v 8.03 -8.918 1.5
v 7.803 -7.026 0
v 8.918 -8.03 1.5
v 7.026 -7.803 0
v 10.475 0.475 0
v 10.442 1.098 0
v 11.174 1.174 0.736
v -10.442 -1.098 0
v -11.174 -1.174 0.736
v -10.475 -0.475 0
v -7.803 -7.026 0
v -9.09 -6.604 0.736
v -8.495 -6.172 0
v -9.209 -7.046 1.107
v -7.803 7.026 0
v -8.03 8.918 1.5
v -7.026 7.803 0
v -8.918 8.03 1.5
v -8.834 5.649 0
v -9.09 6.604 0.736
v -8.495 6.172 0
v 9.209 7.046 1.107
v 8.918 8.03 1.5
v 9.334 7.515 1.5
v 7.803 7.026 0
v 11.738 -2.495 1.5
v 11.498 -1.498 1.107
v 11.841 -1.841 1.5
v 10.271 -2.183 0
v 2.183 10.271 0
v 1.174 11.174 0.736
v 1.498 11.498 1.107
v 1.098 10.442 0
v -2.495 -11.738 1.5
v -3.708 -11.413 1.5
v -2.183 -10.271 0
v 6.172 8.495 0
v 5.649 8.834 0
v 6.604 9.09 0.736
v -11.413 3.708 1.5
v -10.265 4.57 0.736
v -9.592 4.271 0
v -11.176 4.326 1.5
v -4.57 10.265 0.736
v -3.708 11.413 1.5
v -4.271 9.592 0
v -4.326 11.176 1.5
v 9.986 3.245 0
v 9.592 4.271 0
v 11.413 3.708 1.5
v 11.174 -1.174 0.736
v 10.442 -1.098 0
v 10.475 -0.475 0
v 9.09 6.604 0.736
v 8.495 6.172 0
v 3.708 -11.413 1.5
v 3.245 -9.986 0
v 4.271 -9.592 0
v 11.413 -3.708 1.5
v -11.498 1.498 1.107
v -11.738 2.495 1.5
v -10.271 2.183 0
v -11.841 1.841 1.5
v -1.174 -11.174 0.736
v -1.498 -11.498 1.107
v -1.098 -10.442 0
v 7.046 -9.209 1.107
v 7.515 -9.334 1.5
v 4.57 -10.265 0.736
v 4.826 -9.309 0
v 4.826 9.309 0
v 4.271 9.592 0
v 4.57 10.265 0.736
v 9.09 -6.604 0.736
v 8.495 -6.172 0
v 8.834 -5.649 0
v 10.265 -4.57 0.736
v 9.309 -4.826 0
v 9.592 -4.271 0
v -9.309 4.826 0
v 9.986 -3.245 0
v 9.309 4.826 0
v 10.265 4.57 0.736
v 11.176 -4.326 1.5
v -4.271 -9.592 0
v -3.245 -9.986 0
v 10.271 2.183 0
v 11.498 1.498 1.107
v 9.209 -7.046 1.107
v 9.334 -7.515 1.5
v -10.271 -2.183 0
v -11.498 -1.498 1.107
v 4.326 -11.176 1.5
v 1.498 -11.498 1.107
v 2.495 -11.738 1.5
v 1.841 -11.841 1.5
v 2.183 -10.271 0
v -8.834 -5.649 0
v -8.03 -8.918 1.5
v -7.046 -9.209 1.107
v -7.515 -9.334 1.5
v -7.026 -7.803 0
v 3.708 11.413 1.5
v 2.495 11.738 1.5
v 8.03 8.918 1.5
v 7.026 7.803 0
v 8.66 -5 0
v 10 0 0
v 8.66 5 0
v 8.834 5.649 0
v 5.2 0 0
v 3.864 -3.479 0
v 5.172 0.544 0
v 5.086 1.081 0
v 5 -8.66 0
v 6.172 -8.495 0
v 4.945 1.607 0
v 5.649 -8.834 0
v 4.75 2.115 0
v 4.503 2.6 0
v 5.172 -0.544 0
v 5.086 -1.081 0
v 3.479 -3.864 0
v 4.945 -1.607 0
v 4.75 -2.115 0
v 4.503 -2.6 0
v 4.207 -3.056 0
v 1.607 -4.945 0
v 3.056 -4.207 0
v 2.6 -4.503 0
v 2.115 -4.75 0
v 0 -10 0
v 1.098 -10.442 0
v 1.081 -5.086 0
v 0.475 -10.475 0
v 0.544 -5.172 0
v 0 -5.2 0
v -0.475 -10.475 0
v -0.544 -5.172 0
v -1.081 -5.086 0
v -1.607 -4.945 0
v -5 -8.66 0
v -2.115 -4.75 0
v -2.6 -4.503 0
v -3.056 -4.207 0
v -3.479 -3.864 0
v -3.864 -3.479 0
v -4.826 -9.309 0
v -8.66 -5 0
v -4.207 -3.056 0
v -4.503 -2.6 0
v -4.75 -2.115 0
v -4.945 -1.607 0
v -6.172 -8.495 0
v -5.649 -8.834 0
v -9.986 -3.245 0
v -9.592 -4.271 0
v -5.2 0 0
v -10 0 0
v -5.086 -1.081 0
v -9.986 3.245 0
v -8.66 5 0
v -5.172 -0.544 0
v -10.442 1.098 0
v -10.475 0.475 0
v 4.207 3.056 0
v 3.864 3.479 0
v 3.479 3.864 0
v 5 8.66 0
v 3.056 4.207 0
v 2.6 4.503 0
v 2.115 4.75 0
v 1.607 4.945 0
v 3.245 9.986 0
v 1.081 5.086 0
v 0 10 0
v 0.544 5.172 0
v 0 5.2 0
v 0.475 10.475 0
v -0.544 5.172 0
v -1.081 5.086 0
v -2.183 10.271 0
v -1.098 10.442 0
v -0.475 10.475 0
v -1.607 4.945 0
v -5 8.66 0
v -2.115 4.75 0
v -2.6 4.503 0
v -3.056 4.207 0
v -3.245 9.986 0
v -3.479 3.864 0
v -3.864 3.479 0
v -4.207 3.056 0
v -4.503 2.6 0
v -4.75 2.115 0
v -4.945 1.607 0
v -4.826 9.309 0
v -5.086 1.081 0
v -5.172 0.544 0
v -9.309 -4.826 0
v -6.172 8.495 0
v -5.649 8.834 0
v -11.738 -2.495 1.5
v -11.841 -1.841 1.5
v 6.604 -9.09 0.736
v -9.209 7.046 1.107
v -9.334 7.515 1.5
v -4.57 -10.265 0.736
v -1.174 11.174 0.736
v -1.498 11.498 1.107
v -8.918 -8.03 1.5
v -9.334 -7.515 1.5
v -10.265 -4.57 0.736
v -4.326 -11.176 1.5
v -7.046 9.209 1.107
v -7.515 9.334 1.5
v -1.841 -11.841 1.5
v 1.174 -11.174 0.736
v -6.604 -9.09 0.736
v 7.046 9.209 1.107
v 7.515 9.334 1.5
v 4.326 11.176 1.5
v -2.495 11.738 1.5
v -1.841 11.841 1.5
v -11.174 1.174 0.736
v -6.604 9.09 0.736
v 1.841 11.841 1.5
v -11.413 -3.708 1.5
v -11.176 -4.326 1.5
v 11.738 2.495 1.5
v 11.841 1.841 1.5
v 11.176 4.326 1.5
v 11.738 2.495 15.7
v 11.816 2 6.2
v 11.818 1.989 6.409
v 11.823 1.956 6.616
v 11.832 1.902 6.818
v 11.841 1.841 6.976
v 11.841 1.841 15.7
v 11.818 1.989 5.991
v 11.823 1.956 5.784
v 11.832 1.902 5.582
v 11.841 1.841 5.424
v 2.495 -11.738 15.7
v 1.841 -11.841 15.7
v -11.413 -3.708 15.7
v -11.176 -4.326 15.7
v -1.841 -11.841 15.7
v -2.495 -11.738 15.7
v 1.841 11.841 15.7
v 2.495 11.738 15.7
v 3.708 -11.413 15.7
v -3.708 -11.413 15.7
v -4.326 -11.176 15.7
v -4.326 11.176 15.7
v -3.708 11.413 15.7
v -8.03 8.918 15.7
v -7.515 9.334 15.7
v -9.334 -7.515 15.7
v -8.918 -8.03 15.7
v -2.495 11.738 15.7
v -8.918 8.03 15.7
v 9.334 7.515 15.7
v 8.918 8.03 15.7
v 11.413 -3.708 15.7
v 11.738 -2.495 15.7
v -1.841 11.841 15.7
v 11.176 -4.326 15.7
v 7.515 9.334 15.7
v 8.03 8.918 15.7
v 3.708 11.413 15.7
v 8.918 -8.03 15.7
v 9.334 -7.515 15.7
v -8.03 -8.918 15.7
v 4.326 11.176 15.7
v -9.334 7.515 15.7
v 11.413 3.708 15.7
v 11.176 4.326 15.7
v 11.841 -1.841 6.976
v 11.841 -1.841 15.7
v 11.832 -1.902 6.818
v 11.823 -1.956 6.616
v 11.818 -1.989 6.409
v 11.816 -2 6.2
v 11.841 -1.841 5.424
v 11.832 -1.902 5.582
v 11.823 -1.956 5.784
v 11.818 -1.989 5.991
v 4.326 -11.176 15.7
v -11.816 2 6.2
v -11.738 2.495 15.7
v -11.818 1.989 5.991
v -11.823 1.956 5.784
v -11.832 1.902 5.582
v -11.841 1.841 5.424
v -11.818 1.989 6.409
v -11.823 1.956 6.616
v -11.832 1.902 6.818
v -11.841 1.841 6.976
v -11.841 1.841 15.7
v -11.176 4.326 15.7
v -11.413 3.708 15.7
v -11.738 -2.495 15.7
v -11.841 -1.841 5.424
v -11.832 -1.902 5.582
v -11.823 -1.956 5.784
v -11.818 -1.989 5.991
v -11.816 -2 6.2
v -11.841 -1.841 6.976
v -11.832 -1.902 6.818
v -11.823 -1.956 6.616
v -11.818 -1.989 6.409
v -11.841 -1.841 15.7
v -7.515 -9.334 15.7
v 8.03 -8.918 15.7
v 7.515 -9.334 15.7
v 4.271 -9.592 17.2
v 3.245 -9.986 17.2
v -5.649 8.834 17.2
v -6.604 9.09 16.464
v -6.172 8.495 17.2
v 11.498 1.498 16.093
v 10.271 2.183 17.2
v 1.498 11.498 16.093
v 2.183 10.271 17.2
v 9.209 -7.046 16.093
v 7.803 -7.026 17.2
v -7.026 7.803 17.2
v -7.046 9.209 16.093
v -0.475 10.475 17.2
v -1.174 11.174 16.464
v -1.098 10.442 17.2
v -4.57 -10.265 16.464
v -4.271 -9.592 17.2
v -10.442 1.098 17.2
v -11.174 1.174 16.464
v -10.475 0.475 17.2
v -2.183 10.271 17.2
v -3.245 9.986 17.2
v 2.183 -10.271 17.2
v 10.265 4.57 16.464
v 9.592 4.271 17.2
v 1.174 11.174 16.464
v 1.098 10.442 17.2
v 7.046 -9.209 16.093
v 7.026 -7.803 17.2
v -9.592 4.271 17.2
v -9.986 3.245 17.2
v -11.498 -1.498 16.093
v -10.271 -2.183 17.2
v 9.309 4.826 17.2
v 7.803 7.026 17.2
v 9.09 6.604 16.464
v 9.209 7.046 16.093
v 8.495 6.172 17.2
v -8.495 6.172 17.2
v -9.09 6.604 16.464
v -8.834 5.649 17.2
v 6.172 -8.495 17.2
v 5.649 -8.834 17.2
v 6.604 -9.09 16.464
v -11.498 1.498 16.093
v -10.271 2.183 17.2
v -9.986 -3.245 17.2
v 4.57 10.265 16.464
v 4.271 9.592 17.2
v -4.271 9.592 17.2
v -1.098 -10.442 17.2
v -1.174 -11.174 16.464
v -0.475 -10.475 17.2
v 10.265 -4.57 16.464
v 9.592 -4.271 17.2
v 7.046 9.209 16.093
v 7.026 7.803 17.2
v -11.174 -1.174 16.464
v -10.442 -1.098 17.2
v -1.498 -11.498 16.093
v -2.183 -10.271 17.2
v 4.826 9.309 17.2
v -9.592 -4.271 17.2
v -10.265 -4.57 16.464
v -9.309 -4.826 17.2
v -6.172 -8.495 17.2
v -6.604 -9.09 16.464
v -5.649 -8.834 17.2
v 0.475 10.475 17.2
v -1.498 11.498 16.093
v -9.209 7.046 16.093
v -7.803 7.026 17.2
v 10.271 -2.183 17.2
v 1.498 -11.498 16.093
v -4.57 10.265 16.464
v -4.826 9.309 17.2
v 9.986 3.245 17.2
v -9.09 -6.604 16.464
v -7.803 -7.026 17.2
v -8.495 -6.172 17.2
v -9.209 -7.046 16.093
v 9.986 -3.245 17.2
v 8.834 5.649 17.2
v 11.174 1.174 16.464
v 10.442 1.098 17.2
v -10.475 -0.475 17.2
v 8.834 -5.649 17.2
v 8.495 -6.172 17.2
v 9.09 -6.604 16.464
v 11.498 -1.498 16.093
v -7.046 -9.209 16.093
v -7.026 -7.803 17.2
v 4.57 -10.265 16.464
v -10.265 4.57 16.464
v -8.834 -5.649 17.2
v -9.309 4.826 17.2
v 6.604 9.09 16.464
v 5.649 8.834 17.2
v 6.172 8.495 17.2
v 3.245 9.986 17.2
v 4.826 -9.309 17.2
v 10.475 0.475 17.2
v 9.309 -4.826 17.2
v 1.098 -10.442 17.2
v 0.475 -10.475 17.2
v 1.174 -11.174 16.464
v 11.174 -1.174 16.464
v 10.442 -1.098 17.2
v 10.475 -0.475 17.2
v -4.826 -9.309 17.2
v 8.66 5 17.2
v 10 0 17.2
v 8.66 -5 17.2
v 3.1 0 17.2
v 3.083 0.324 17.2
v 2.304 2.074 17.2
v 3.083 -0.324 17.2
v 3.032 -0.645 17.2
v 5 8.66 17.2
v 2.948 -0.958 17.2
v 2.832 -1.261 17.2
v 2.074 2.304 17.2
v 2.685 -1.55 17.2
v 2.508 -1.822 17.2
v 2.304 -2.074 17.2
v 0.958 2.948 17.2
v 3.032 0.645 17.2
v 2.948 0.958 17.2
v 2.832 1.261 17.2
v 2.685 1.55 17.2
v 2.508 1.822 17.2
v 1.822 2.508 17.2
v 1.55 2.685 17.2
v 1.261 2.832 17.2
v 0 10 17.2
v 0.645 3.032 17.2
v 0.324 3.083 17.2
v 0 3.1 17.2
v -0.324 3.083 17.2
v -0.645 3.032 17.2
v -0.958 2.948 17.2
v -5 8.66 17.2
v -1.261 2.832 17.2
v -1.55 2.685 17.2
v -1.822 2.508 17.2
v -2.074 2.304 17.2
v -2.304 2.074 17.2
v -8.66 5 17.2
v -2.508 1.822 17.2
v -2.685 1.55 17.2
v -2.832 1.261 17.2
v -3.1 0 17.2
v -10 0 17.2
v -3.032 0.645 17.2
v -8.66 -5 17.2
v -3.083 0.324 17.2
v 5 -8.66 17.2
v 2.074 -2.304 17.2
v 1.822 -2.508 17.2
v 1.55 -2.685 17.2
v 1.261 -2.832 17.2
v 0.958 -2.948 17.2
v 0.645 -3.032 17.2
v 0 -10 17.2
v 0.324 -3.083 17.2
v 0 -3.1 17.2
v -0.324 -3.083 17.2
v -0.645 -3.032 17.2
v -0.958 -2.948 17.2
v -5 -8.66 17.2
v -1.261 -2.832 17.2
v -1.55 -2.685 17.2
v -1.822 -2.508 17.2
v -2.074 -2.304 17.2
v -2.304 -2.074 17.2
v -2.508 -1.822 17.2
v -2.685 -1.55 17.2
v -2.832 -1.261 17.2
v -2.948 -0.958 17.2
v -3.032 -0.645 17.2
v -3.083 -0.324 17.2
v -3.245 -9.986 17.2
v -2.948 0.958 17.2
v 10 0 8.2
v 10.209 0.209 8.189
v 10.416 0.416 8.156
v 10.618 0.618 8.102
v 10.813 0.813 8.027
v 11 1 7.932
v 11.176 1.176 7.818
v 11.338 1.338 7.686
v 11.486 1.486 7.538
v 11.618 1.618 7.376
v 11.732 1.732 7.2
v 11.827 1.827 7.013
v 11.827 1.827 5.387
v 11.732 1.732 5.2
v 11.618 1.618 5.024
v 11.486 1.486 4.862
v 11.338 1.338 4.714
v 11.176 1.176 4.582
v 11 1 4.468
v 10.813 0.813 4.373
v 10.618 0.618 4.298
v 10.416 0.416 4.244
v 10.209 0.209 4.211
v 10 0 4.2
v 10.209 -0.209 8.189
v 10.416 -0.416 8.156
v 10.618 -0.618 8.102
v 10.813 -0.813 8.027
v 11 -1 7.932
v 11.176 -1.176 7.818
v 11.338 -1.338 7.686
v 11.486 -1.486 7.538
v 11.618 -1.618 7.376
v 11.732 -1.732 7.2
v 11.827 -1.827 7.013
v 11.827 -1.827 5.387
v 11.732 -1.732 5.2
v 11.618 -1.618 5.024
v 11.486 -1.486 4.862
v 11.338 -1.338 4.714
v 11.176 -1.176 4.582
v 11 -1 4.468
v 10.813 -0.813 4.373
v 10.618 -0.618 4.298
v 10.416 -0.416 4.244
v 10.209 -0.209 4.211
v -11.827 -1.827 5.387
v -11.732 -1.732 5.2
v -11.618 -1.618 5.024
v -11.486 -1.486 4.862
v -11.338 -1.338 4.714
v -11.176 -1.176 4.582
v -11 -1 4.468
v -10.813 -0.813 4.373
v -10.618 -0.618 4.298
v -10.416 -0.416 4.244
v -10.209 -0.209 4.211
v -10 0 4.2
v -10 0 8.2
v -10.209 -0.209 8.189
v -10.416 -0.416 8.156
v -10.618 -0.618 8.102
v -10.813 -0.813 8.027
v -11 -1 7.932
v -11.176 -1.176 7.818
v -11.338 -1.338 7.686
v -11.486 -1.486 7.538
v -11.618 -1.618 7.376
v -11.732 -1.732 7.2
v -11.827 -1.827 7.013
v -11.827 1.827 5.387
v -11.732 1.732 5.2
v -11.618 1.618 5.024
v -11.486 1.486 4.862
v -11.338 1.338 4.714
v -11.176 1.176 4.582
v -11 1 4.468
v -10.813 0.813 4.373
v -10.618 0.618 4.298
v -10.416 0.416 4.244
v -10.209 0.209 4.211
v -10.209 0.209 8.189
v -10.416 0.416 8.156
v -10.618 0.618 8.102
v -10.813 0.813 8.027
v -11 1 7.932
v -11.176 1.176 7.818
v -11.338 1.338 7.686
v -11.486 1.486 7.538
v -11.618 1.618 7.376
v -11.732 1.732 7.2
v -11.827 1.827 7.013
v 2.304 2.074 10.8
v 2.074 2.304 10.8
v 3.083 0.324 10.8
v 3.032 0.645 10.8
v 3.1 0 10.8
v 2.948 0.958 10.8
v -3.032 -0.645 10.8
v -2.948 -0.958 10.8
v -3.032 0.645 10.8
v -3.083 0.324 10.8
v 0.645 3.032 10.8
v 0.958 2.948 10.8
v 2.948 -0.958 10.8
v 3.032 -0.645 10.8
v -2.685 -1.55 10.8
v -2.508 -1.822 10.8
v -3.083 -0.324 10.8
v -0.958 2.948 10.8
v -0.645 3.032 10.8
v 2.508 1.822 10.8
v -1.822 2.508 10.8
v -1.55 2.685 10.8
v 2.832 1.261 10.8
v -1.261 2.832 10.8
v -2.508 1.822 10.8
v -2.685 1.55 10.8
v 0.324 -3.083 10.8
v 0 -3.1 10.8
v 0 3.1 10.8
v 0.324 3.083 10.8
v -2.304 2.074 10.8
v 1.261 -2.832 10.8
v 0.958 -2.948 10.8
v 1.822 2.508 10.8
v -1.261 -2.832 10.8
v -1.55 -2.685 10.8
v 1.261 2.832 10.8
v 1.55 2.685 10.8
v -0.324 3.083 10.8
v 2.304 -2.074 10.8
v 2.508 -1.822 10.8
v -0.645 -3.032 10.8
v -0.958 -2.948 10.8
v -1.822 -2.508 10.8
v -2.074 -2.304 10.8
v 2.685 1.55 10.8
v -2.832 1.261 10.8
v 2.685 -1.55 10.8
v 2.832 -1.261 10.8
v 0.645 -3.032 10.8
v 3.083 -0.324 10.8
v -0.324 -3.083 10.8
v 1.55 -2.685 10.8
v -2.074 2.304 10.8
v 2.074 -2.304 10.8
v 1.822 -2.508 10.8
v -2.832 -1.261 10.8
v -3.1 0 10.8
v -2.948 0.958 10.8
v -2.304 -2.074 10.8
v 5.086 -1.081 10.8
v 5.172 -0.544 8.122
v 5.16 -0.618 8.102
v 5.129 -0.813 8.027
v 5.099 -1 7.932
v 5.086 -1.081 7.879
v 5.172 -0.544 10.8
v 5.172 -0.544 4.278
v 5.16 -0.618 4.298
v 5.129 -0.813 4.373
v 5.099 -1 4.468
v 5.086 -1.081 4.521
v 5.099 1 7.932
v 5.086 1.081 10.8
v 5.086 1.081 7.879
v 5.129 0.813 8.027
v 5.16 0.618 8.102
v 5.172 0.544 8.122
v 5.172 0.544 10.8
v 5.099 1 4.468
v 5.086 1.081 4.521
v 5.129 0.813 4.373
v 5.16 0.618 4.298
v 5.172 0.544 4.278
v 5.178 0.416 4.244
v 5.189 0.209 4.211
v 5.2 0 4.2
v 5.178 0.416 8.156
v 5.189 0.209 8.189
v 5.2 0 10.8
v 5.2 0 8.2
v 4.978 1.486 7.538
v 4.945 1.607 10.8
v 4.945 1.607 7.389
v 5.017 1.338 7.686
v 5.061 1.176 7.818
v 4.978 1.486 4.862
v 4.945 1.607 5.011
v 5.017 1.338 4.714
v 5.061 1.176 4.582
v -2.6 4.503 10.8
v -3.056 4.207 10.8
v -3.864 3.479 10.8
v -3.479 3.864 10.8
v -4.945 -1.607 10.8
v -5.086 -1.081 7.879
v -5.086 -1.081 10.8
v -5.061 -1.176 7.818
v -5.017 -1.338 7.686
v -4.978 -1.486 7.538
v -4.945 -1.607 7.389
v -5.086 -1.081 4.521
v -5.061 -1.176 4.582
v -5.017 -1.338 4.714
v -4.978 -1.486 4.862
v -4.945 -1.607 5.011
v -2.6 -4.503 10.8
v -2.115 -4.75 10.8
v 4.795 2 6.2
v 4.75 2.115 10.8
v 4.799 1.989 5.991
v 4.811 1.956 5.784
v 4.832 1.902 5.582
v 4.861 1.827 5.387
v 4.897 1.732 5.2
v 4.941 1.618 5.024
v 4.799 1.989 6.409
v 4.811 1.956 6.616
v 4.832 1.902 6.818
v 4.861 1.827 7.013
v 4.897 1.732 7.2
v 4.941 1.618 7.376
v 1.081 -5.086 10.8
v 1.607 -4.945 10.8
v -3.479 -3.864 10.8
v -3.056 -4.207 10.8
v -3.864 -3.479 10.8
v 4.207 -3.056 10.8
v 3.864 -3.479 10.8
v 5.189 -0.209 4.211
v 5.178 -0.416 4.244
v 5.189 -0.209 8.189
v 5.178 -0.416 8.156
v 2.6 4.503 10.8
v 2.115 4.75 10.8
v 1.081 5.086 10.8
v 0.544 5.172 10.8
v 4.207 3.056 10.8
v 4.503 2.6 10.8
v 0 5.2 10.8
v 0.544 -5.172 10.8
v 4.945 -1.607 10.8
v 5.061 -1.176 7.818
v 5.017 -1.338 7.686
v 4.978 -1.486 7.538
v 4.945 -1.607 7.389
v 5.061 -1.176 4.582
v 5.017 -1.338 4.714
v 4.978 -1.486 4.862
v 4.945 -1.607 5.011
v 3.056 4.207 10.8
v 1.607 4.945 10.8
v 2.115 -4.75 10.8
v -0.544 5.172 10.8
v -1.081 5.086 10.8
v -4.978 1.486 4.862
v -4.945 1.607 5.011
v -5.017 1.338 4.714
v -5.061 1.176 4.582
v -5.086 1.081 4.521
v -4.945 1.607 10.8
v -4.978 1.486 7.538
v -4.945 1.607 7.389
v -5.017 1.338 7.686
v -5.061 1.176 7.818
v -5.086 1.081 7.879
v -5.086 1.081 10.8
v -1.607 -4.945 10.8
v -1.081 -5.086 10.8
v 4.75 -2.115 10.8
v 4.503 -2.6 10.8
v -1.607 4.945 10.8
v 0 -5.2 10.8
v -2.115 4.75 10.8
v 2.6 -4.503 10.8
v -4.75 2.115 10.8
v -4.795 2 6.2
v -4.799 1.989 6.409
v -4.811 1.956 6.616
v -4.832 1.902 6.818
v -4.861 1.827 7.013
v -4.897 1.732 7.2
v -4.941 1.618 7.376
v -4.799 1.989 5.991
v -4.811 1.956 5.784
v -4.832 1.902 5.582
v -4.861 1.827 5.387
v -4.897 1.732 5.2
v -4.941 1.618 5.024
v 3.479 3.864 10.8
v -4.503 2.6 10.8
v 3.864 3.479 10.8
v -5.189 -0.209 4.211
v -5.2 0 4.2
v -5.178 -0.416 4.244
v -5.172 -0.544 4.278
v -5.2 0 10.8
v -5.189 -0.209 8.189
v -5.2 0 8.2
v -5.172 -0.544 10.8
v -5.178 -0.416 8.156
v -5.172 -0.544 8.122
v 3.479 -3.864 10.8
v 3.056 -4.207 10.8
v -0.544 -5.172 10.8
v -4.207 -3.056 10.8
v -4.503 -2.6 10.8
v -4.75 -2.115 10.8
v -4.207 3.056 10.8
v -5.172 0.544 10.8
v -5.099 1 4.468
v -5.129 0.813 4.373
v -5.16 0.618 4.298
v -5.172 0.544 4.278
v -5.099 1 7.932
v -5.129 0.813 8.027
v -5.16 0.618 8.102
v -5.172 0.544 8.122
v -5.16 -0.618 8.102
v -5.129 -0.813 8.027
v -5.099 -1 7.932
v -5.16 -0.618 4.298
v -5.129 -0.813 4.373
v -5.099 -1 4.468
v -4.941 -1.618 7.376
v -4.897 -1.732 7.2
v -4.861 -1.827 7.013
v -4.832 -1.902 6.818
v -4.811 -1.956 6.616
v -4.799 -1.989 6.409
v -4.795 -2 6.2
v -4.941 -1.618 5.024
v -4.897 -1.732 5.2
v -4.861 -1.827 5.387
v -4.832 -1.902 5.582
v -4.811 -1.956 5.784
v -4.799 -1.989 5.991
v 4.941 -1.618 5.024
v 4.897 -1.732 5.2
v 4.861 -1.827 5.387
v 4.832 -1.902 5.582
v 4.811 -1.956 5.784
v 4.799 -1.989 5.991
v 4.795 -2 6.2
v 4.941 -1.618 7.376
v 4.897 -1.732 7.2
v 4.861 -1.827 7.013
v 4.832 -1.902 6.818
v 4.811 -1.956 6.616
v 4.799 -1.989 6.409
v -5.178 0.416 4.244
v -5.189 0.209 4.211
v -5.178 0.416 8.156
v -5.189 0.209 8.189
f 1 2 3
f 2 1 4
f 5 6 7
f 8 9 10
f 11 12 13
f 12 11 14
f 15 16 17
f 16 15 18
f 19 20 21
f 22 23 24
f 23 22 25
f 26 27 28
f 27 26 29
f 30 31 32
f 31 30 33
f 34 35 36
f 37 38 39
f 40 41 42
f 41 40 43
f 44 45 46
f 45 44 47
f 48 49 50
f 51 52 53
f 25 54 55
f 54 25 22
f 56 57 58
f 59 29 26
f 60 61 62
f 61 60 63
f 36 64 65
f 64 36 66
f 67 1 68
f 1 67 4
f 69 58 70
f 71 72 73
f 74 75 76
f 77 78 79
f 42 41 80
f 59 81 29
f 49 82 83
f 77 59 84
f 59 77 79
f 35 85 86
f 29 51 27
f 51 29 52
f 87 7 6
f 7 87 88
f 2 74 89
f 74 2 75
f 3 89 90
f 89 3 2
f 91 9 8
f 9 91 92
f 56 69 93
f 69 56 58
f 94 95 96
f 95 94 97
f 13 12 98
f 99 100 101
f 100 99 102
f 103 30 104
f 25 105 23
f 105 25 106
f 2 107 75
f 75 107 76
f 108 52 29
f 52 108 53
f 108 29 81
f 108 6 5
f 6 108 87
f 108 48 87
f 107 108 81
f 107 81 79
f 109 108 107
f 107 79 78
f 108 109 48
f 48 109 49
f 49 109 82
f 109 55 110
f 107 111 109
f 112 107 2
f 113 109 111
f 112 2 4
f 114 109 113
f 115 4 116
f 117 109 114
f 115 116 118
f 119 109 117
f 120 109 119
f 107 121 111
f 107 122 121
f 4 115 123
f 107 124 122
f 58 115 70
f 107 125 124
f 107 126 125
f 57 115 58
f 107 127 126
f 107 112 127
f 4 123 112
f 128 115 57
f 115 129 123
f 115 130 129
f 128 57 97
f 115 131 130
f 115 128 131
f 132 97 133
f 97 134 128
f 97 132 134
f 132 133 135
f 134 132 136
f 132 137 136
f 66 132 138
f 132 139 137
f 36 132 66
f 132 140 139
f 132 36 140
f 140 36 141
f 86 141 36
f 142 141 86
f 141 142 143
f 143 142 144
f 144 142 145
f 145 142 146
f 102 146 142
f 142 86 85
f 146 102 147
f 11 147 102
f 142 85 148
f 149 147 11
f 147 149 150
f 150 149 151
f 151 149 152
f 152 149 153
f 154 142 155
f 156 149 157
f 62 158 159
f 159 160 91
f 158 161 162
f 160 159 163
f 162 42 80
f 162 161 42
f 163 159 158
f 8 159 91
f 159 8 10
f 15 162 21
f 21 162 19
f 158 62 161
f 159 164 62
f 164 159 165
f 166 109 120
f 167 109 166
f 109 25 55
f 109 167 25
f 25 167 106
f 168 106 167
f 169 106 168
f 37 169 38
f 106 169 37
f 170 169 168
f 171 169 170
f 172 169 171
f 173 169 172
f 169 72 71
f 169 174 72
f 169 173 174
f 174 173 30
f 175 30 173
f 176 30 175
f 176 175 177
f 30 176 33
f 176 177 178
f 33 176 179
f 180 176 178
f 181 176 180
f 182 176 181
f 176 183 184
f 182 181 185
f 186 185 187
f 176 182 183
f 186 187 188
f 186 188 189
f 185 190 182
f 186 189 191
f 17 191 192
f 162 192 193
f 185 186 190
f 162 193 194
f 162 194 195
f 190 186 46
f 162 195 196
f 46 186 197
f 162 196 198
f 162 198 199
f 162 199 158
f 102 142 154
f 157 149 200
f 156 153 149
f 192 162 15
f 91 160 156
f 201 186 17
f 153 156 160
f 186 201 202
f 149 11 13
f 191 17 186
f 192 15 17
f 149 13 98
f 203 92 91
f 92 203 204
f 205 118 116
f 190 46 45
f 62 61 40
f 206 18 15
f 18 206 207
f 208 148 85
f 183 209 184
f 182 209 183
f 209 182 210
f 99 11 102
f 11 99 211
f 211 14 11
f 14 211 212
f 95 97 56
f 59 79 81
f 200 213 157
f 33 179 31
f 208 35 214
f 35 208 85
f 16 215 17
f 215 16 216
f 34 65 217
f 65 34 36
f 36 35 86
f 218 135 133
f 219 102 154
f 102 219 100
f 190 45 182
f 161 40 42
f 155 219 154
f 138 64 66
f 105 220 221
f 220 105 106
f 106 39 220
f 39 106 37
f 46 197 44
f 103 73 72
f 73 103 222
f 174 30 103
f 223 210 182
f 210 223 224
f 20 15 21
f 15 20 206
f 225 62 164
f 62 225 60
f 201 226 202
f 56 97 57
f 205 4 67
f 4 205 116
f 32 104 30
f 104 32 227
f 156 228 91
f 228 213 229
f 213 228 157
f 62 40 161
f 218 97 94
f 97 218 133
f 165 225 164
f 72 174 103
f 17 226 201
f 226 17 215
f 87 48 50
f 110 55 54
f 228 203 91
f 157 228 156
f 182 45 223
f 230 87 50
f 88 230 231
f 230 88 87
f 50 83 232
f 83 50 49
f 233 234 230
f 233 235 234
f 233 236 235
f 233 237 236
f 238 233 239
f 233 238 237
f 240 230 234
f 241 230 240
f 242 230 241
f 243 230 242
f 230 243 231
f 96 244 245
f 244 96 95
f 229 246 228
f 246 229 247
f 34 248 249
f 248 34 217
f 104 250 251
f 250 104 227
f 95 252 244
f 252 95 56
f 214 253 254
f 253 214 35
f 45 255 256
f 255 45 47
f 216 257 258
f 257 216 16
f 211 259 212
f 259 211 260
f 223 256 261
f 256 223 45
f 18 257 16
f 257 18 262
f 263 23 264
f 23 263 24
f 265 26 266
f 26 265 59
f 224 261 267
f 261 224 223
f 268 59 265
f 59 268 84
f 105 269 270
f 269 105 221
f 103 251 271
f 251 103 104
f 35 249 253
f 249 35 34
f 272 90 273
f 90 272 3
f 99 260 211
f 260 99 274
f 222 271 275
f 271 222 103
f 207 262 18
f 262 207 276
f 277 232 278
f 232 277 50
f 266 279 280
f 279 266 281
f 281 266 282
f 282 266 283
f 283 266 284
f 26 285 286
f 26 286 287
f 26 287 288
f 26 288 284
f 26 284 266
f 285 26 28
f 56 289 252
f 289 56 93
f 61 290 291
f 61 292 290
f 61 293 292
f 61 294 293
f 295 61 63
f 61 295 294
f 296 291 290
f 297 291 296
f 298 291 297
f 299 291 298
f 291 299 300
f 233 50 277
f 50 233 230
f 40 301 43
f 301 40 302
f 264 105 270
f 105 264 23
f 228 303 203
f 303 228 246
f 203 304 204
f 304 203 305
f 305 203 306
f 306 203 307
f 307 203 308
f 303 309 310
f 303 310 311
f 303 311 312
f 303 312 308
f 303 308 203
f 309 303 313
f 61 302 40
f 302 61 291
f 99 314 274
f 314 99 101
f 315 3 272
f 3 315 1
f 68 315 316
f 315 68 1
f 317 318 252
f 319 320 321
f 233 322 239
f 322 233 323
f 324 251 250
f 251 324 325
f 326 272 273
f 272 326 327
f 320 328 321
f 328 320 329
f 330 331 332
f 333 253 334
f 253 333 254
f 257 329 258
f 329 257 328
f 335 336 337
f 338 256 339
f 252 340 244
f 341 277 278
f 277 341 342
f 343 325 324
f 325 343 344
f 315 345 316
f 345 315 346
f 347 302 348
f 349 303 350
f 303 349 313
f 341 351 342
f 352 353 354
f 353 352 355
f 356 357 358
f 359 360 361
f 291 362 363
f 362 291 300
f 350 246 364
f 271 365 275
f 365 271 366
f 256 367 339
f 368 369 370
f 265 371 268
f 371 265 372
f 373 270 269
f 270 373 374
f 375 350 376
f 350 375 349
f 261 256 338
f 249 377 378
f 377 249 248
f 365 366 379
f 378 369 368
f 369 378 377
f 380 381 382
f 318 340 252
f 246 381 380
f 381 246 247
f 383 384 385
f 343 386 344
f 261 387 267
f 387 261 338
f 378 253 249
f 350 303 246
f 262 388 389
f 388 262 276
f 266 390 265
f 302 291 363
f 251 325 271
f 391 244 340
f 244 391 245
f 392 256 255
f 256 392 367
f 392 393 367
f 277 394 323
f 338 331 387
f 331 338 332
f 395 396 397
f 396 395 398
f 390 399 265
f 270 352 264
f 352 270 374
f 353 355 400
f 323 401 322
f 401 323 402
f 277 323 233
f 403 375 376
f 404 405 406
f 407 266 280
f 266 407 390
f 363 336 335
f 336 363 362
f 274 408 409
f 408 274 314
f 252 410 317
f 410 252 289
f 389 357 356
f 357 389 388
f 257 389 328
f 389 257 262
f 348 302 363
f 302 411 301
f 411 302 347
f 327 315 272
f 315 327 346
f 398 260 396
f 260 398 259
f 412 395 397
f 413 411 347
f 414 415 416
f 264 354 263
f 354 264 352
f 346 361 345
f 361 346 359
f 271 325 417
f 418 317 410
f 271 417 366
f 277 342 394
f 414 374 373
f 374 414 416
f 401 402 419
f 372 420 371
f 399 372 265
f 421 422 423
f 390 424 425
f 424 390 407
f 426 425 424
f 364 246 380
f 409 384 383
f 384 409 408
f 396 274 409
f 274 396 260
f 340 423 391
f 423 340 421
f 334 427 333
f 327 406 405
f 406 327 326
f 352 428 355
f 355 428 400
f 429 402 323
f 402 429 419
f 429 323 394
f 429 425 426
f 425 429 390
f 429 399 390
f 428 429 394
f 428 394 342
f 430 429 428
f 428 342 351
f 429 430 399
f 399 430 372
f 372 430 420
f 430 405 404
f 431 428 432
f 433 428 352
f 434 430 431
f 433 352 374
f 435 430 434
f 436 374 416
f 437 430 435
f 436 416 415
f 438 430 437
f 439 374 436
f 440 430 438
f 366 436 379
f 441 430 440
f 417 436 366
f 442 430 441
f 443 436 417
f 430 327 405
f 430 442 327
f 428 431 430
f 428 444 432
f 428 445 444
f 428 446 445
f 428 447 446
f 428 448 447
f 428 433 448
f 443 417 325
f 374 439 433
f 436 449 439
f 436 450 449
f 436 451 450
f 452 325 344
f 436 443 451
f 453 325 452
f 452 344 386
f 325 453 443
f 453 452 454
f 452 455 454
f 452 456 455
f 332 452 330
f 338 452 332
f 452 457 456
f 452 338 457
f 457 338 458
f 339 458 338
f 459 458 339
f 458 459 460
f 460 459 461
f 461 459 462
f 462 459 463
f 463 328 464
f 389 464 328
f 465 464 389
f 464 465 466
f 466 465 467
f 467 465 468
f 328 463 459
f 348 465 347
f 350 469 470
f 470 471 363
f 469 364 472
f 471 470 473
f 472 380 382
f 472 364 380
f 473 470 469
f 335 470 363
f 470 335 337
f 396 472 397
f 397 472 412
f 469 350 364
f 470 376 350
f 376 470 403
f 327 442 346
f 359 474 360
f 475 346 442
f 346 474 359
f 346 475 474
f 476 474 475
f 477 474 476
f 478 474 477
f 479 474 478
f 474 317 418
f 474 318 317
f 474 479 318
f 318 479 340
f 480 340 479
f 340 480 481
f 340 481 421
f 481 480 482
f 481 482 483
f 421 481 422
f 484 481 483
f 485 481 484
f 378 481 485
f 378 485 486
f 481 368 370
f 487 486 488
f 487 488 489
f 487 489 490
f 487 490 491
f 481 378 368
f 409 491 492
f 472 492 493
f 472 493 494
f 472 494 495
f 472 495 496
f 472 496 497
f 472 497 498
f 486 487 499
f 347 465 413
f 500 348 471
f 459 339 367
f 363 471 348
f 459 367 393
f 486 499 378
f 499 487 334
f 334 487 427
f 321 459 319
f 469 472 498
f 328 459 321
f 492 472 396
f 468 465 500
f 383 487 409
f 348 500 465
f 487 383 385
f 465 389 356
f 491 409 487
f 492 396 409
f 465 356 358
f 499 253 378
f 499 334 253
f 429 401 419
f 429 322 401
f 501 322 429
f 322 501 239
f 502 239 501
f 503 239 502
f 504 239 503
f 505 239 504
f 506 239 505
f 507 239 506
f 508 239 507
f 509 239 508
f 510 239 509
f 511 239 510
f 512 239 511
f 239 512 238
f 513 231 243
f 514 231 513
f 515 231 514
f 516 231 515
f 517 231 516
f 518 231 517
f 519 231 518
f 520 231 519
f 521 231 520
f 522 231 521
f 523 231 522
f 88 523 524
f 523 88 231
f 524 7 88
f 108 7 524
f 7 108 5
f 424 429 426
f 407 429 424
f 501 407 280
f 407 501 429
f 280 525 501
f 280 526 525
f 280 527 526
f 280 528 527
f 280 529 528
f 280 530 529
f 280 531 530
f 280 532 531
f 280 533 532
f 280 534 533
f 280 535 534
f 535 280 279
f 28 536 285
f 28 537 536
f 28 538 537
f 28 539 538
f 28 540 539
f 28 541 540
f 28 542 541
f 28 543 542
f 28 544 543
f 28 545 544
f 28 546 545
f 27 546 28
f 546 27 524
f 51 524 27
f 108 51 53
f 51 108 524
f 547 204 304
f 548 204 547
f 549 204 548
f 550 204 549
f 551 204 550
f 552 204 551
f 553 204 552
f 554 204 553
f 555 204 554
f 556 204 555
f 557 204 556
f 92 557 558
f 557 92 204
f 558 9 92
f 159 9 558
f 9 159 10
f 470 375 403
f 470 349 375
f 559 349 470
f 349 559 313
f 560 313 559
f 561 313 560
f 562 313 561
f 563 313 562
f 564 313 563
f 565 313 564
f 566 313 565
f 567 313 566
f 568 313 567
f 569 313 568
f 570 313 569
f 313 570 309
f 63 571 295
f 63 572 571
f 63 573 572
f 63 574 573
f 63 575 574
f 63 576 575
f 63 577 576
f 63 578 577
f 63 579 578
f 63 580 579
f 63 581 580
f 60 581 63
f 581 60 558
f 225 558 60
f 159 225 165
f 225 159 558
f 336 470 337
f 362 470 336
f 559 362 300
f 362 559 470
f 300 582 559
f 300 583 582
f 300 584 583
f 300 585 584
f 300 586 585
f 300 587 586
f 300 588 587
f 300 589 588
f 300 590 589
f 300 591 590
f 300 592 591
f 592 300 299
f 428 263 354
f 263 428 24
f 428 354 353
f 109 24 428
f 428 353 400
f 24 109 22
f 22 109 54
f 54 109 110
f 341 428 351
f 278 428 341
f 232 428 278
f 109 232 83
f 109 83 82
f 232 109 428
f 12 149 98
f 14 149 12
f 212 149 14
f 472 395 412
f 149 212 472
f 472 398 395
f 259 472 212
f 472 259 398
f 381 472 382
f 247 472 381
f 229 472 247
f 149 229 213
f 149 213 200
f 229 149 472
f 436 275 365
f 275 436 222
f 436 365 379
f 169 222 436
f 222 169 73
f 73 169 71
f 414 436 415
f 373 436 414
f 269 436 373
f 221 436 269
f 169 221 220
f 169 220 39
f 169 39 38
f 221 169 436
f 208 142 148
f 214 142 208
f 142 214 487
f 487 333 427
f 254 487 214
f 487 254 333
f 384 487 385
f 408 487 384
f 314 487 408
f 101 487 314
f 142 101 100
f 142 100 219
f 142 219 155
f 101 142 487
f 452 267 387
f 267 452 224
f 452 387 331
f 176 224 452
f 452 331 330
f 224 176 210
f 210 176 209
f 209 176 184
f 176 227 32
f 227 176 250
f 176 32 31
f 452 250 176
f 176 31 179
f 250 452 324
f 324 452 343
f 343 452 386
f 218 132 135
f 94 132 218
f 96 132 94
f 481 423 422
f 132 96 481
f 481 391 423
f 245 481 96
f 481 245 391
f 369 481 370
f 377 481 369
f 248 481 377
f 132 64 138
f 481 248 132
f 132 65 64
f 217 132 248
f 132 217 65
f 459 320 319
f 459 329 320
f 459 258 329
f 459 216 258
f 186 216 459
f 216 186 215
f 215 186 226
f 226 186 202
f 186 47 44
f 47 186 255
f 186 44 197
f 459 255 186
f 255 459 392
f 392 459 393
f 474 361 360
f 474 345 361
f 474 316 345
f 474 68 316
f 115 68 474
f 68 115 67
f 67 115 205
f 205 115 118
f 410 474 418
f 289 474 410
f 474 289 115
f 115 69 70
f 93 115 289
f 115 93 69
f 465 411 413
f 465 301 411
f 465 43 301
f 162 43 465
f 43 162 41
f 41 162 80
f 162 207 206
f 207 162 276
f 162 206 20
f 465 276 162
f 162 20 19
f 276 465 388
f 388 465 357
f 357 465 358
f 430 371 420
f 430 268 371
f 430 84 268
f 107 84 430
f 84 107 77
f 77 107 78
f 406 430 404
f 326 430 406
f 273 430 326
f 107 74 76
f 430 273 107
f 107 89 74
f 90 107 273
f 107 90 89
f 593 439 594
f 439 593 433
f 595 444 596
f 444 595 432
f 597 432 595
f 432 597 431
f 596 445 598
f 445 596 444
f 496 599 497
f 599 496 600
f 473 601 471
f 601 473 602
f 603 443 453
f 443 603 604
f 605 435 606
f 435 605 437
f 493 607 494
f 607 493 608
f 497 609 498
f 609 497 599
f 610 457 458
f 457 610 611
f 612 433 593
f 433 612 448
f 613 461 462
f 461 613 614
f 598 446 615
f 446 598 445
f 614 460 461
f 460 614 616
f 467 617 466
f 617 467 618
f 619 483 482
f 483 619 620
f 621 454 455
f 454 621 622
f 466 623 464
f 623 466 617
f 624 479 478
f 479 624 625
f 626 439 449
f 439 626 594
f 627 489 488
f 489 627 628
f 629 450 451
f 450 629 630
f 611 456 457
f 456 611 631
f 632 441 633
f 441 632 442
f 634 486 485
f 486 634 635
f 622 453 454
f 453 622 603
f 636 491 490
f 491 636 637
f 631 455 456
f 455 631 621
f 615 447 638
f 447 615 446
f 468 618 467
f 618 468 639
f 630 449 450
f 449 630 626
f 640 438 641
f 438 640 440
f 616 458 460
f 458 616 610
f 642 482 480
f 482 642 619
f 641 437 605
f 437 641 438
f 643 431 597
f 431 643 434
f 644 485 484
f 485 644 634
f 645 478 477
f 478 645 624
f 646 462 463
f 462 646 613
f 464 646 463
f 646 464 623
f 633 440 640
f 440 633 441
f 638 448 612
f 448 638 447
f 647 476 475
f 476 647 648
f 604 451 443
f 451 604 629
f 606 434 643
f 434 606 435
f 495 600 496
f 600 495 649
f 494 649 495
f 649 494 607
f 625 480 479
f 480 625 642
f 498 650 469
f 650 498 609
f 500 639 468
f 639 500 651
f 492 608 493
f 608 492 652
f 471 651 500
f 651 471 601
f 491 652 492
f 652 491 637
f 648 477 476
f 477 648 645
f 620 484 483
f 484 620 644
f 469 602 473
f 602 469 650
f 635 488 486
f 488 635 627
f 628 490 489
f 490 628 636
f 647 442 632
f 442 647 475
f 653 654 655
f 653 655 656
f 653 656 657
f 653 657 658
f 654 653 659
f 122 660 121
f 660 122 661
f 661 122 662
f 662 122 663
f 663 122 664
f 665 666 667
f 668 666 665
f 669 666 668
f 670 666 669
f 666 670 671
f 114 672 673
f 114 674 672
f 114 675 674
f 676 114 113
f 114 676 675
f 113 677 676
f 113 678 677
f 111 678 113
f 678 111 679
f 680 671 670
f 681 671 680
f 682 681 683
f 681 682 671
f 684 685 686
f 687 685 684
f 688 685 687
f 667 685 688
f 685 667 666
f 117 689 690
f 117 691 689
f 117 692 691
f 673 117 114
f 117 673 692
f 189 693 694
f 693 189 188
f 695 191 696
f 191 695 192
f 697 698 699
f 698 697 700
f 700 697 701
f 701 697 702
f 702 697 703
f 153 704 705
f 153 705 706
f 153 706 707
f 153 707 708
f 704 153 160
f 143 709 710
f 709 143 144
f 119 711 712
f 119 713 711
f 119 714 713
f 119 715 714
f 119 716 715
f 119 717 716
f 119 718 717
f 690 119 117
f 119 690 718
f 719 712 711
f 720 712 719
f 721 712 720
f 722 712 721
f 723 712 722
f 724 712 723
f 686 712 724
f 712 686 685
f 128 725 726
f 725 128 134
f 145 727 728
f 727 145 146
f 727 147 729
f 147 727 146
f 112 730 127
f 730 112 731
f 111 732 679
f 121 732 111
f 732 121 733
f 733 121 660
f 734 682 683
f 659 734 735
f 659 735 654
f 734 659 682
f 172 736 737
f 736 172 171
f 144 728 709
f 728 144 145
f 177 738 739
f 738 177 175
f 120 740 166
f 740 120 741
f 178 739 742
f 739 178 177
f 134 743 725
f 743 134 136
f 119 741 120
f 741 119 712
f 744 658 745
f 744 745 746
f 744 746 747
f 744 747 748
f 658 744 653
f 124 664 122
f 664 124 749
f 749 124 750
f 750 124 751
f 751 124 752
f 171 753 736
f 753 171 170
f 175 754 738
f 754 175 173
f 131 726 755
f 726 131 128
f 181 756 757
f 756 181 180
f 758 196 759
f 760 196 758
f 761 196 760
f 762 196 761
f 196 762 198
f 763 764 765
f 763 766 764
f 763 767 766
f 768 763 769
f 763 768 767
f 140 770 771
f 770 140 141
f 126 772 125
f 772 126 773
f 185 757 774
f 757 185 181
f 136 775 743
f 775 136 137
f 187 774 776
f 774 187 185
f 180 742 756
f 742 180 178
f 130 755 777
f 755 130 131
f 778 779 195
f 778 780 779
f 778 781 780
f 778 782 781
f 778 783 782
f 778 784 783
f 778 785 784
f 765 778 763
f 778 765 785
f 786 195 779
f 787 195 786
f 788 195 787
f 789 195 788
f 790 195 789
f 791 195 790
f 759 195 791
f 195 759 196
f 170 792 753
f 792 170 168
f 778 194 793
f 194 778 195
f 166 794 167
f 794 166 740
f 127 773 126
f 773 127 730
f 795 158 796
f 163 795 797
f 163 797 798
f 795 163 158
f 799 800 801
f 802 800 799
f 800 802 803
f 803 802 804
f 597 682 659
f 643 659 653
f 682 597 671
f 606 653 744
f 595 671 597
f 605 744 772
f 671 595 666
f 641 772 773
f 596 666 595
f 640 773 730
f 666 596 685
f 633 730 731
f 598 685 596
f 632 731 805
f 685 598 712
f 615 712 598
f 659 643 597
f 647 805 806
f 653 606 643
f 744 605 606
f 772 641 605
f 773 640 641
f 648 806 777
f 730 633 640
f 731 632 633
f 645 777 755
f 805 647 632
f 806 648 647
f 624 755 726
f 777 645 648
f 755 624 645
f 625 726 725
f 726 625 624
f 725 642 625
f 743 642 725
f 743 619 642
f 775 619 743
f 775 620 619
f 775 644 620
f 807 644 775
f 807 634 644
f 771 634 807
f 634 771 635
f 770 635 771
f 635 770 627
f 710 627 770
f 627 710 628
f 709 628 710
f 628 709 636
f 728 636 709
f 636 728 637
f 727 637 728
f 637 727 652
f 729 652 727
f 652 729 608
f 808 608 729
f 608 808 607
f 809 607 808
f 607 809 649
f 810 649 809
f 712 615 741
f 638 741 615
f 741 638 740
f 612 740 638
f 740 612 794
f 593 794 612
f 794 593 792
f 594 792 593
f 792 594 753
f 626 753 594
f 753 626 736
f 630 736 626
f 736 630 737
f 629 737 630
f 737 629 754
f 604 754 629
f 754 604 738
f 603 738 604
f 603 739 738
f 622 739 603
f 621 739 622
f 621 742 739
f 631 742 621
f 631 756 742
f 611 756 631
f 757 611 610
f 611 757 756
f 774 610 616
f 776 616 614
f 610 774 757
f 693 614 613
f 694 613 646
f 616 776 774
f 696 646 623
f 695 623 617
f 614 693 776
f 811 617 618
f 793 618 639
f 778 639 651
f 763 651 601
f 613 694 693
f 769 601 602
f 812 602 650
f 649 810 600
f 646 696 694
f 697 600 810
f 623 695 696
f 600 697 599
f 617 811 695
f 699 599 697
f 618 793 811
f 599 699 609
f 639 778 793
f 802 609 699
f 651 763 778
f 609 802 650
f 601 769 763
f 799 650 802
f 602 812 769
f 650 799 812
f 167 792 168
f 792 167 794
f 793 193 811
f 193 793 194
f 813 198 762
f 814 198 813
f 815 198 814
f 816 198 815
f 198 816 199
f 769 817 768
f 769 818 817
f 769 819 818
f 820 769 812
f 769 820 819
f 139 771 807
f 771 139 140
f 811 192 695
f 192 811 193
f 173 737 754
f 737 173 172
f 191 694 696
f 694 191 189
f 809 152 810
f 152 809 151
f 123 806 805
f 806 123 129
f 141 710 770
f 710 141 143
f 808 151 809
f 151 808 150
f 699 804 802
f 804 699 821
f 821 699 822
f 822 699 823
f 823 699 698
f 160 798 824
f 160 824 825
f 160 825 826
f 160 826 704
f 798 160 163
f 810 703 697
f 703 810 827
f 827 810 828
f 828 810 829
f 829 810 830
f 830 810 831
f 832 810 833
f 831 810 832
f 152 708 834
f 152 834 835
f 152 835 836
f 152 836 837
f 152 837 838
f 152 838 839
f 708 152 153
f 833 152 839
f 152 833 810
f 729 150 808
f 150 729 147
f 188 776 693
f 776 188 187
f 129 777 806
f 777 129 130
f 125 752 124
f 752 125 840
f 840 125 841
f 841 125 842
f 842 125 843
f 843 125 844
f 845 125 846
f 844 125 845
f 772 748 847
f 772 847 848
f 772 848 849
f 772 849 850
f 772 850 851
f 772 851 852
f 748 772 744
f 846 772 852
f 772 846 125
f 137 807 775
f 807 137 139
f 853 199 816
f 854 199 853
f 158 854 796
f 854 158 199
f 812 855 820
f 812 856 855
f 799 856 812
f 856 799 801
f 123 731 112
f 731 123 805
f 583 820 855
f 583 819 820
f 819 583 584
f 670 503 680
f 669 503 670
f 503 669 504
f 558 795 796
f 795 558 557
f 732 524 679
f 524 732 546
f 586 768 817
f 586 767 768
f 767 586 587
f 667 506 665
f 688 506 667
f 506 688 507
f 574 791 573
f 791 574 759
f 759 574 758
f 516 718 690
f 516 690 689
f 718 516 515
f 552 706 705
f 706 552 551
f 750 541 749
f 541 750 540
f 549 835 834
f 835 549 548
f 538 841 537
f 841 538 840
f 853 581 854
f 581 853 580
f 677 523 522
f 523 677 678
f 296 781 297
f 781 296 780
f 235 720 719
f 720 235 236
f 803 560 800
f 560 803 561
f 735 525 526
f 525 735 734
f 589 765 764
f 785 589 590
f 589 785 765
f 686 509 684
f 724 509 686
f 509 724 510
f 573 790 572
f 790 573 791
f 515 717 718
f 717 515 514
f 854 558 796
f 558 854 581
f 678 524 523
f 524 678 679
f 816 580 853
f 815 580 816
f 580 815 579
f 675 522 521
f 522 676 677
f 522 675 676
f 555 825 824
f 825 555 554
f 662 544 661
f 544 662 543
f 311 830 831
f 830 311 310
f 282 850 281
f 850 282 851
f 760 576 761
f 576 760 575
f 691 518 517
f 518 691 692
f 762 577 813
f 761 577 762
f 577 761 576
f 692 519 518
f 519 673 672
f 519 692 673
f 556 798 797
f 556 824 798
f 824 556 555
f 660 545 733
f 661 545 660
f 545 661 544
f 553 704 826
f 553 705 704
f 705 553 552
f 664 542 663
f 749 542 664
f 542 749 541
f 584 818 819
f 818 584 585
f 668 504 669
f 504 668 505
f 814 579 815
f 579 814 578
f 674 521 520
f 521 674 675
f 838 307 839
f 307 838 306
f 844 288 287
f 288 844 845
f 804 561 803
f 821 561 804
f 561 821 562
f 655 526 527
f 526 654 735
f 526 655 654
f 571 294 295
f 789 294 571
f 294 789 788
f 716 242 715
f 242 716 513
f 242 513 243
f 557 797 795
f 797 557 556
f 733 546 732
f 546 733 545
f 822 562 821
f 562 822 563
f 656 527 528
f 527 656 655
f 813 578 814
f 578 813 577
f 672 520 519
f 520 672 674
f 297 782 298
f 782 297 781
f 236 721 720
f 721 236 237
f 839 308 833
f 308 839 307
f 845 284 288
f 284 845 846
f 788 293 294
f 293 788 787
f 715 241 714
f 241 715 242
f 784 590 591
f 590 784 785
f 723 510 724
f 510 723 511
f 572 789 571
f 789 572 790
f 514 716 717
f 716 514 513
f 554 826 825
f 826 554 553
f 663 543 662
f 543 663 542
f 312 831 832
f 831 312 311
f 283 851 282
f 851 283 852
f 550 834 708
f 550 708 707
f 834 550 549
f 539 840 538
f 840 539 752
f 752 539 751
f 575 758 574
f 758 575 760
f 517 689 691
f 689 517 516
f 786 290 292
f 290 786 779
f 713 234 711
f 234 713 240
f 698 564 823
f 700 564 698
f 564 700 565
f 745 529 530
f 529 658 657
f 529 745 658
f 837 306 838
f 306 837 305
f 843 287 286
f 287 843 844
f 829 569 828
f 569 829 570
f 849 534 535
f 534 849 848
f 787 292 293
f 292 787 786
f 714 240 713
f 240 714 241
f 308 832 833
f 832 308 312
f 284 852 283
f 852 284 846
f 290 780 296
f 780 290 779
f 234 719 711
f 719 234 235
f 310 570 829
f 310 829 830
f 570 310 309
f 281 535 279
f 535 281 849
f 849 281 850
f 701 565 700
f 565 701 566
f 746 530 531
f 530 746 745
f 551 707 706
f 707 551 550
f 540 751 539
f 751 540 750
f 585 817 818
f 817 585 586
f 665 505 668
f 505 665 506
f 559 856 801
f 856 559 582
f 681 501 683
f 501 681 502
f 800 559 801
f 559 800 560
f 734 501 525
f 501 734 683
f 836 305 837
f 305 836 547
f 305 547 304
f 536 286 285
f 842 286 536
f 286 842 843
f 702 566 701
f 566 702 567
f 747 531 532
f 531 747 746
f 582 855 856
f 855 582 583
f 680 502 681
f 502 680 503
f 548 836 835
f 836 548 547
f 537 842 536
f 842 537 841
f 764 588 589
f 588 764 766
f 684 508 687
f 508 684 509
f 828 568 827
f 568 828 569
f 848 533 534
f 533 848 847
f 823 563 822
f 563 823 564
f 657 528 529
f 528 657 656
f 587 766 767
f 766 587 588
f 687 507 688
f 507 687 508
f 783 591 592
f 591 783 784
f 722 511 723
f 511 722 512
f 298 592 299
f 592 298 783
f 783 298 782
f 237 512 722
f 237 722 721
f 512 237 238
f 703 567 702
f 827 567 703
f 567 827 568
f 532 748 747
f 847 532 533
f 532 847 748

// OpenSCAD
module focus_wheel() {

$fn=60;

vFocusWheel_d = 24;
vFocusWheel_h = 17.2;
vThread_d = 6.2;
vThread_h = vFocusWheel_h;

vThreadNut_d = 10.4;
vThreadNut_h = 10.8;
vThreadNut_offsetZ = 0;

vEdgecut = 1.5;


vLowerSegment_d1 = vFocusWheel_d - 2*vEdgecut;
vLowerSegment_d2 = vFocusWheel_d;
vLowerSegment_h = vEdgecut;
vLowerSegment_offsetZ = 0;

vMidSegment_d = vFocusWheel_d;
vMidSegment_h = vFocusWheel_h - 2*vEdgecut;
vMidSegment_offsetZ = vLowerSegment_h;

vUpperSegment_d1 = vFocusWheel_d;
vUpperSegment_d2 = vFocusWheel_d - 2*vEdgecut;
vUpperSegment_h = vEdgecut;
vUpperSegment_offsetZ = vLowerSegment_h+vMidSegment_h;

vLockingScrewHole_d = 4;
vLockingScrewHole_h = vFocusWheel_d;
vLockingScrewHole_offsetX = -vFocusWheel_d/2;
vLockingScrewHole_offsetZ = vFocusWheel_h-11;

vCutout_l = vFocusWheel_h;
vCutout_w = 4;
vCutout_h = 2;
vCutout_offsetX = vFocusWheel_d/2;
vCutout_offsetY = -vCutout_w/2;
vCutout_offsetZ = 0;


module roof(l, w, h){
    polyhedron(
        points=[
            [0,0,0],
            [l,0,0],
            [l,w,0],
            [0,w,0],
            [0,w/2,h],
            [l,w/2,h]
            ],
        faces=[
            [0,1,2,3],
            [0,4,1],
            [1,4,5,2],
            [2,5,3],
            [3,5,4,0]
            ]
            );
    };

//roof(20, 10, 15);

module wedge(l, w, h) {
    polyhedron(
            points=[
                [0,0,0],
                [l,0,0],
                [0,w,0],
                [0,0,h],
                [l,0,h],
                [0,w,h]
            ],
            faces=[
                [0,1,2],
                [0,3,4,1],
                [1,4,5,2],
                [2,5,3,0],
                [3,5,4]
            ]
    );
   };    
//wedge(20, 30, 40);

module tube(d1, d2, h) {
    difference() {
        cylinder(d=d1, h=h);
        cylinder(d=d2, h=h);
        }
    };
    



difference(){
    union(){
        cylinder(d1=vLowerSegment_d1, d2=vLowerSegment_d2, h=vLowerSegment_h);

        translate([0, 0, vMidSegment_offsetZ])
        cylinder(d=vMidSegment_d, h=vMidSegment_h);   
           
        translate([0, 0, vUpperSegment_offsetZ])   
        cylinder(d1=vUpperSegment_d1, d2=vUpperSegment_d2, h=vUpperSegment_h); 
    };    
    
    // thread hole
    cylinder(d=vThread_d, h=vThread_h);
    
    // thread nut hole
    translate([0, 0, vThreadNut_offsetZ])
        cylinder(d=vThreadNut_d, h=vThreadNut_h);
    
   
    
    // locking screw hole
    translate([vLockingScrewHole_offsetX, 0, vLockingScrewHole_offsetZ])
        rotate([0,90, 0])
            cylinder(d=vLockingScrewHole_d, h=vLockingScrewHole_h);
    
    
    for (i=[0:5]){
    rotate([0, 0, i*30])    
        union(){
        translate([vCutout_offsetX, vCutout_offsetY, vCutout_offsetZ])
            rotate([0, 270, 0])
                roof(vCutout_l, vCutout_w, vCutout_h);

        translate([-vCutout_offsetX, vCutout_offsetY, vCutout_offsetZ])
            rotate([0, 270, 0])
                roof(vCutout_l, vCutout_w, -vCutout_h);
        };
    };
    

};

};

focus_wheel();
